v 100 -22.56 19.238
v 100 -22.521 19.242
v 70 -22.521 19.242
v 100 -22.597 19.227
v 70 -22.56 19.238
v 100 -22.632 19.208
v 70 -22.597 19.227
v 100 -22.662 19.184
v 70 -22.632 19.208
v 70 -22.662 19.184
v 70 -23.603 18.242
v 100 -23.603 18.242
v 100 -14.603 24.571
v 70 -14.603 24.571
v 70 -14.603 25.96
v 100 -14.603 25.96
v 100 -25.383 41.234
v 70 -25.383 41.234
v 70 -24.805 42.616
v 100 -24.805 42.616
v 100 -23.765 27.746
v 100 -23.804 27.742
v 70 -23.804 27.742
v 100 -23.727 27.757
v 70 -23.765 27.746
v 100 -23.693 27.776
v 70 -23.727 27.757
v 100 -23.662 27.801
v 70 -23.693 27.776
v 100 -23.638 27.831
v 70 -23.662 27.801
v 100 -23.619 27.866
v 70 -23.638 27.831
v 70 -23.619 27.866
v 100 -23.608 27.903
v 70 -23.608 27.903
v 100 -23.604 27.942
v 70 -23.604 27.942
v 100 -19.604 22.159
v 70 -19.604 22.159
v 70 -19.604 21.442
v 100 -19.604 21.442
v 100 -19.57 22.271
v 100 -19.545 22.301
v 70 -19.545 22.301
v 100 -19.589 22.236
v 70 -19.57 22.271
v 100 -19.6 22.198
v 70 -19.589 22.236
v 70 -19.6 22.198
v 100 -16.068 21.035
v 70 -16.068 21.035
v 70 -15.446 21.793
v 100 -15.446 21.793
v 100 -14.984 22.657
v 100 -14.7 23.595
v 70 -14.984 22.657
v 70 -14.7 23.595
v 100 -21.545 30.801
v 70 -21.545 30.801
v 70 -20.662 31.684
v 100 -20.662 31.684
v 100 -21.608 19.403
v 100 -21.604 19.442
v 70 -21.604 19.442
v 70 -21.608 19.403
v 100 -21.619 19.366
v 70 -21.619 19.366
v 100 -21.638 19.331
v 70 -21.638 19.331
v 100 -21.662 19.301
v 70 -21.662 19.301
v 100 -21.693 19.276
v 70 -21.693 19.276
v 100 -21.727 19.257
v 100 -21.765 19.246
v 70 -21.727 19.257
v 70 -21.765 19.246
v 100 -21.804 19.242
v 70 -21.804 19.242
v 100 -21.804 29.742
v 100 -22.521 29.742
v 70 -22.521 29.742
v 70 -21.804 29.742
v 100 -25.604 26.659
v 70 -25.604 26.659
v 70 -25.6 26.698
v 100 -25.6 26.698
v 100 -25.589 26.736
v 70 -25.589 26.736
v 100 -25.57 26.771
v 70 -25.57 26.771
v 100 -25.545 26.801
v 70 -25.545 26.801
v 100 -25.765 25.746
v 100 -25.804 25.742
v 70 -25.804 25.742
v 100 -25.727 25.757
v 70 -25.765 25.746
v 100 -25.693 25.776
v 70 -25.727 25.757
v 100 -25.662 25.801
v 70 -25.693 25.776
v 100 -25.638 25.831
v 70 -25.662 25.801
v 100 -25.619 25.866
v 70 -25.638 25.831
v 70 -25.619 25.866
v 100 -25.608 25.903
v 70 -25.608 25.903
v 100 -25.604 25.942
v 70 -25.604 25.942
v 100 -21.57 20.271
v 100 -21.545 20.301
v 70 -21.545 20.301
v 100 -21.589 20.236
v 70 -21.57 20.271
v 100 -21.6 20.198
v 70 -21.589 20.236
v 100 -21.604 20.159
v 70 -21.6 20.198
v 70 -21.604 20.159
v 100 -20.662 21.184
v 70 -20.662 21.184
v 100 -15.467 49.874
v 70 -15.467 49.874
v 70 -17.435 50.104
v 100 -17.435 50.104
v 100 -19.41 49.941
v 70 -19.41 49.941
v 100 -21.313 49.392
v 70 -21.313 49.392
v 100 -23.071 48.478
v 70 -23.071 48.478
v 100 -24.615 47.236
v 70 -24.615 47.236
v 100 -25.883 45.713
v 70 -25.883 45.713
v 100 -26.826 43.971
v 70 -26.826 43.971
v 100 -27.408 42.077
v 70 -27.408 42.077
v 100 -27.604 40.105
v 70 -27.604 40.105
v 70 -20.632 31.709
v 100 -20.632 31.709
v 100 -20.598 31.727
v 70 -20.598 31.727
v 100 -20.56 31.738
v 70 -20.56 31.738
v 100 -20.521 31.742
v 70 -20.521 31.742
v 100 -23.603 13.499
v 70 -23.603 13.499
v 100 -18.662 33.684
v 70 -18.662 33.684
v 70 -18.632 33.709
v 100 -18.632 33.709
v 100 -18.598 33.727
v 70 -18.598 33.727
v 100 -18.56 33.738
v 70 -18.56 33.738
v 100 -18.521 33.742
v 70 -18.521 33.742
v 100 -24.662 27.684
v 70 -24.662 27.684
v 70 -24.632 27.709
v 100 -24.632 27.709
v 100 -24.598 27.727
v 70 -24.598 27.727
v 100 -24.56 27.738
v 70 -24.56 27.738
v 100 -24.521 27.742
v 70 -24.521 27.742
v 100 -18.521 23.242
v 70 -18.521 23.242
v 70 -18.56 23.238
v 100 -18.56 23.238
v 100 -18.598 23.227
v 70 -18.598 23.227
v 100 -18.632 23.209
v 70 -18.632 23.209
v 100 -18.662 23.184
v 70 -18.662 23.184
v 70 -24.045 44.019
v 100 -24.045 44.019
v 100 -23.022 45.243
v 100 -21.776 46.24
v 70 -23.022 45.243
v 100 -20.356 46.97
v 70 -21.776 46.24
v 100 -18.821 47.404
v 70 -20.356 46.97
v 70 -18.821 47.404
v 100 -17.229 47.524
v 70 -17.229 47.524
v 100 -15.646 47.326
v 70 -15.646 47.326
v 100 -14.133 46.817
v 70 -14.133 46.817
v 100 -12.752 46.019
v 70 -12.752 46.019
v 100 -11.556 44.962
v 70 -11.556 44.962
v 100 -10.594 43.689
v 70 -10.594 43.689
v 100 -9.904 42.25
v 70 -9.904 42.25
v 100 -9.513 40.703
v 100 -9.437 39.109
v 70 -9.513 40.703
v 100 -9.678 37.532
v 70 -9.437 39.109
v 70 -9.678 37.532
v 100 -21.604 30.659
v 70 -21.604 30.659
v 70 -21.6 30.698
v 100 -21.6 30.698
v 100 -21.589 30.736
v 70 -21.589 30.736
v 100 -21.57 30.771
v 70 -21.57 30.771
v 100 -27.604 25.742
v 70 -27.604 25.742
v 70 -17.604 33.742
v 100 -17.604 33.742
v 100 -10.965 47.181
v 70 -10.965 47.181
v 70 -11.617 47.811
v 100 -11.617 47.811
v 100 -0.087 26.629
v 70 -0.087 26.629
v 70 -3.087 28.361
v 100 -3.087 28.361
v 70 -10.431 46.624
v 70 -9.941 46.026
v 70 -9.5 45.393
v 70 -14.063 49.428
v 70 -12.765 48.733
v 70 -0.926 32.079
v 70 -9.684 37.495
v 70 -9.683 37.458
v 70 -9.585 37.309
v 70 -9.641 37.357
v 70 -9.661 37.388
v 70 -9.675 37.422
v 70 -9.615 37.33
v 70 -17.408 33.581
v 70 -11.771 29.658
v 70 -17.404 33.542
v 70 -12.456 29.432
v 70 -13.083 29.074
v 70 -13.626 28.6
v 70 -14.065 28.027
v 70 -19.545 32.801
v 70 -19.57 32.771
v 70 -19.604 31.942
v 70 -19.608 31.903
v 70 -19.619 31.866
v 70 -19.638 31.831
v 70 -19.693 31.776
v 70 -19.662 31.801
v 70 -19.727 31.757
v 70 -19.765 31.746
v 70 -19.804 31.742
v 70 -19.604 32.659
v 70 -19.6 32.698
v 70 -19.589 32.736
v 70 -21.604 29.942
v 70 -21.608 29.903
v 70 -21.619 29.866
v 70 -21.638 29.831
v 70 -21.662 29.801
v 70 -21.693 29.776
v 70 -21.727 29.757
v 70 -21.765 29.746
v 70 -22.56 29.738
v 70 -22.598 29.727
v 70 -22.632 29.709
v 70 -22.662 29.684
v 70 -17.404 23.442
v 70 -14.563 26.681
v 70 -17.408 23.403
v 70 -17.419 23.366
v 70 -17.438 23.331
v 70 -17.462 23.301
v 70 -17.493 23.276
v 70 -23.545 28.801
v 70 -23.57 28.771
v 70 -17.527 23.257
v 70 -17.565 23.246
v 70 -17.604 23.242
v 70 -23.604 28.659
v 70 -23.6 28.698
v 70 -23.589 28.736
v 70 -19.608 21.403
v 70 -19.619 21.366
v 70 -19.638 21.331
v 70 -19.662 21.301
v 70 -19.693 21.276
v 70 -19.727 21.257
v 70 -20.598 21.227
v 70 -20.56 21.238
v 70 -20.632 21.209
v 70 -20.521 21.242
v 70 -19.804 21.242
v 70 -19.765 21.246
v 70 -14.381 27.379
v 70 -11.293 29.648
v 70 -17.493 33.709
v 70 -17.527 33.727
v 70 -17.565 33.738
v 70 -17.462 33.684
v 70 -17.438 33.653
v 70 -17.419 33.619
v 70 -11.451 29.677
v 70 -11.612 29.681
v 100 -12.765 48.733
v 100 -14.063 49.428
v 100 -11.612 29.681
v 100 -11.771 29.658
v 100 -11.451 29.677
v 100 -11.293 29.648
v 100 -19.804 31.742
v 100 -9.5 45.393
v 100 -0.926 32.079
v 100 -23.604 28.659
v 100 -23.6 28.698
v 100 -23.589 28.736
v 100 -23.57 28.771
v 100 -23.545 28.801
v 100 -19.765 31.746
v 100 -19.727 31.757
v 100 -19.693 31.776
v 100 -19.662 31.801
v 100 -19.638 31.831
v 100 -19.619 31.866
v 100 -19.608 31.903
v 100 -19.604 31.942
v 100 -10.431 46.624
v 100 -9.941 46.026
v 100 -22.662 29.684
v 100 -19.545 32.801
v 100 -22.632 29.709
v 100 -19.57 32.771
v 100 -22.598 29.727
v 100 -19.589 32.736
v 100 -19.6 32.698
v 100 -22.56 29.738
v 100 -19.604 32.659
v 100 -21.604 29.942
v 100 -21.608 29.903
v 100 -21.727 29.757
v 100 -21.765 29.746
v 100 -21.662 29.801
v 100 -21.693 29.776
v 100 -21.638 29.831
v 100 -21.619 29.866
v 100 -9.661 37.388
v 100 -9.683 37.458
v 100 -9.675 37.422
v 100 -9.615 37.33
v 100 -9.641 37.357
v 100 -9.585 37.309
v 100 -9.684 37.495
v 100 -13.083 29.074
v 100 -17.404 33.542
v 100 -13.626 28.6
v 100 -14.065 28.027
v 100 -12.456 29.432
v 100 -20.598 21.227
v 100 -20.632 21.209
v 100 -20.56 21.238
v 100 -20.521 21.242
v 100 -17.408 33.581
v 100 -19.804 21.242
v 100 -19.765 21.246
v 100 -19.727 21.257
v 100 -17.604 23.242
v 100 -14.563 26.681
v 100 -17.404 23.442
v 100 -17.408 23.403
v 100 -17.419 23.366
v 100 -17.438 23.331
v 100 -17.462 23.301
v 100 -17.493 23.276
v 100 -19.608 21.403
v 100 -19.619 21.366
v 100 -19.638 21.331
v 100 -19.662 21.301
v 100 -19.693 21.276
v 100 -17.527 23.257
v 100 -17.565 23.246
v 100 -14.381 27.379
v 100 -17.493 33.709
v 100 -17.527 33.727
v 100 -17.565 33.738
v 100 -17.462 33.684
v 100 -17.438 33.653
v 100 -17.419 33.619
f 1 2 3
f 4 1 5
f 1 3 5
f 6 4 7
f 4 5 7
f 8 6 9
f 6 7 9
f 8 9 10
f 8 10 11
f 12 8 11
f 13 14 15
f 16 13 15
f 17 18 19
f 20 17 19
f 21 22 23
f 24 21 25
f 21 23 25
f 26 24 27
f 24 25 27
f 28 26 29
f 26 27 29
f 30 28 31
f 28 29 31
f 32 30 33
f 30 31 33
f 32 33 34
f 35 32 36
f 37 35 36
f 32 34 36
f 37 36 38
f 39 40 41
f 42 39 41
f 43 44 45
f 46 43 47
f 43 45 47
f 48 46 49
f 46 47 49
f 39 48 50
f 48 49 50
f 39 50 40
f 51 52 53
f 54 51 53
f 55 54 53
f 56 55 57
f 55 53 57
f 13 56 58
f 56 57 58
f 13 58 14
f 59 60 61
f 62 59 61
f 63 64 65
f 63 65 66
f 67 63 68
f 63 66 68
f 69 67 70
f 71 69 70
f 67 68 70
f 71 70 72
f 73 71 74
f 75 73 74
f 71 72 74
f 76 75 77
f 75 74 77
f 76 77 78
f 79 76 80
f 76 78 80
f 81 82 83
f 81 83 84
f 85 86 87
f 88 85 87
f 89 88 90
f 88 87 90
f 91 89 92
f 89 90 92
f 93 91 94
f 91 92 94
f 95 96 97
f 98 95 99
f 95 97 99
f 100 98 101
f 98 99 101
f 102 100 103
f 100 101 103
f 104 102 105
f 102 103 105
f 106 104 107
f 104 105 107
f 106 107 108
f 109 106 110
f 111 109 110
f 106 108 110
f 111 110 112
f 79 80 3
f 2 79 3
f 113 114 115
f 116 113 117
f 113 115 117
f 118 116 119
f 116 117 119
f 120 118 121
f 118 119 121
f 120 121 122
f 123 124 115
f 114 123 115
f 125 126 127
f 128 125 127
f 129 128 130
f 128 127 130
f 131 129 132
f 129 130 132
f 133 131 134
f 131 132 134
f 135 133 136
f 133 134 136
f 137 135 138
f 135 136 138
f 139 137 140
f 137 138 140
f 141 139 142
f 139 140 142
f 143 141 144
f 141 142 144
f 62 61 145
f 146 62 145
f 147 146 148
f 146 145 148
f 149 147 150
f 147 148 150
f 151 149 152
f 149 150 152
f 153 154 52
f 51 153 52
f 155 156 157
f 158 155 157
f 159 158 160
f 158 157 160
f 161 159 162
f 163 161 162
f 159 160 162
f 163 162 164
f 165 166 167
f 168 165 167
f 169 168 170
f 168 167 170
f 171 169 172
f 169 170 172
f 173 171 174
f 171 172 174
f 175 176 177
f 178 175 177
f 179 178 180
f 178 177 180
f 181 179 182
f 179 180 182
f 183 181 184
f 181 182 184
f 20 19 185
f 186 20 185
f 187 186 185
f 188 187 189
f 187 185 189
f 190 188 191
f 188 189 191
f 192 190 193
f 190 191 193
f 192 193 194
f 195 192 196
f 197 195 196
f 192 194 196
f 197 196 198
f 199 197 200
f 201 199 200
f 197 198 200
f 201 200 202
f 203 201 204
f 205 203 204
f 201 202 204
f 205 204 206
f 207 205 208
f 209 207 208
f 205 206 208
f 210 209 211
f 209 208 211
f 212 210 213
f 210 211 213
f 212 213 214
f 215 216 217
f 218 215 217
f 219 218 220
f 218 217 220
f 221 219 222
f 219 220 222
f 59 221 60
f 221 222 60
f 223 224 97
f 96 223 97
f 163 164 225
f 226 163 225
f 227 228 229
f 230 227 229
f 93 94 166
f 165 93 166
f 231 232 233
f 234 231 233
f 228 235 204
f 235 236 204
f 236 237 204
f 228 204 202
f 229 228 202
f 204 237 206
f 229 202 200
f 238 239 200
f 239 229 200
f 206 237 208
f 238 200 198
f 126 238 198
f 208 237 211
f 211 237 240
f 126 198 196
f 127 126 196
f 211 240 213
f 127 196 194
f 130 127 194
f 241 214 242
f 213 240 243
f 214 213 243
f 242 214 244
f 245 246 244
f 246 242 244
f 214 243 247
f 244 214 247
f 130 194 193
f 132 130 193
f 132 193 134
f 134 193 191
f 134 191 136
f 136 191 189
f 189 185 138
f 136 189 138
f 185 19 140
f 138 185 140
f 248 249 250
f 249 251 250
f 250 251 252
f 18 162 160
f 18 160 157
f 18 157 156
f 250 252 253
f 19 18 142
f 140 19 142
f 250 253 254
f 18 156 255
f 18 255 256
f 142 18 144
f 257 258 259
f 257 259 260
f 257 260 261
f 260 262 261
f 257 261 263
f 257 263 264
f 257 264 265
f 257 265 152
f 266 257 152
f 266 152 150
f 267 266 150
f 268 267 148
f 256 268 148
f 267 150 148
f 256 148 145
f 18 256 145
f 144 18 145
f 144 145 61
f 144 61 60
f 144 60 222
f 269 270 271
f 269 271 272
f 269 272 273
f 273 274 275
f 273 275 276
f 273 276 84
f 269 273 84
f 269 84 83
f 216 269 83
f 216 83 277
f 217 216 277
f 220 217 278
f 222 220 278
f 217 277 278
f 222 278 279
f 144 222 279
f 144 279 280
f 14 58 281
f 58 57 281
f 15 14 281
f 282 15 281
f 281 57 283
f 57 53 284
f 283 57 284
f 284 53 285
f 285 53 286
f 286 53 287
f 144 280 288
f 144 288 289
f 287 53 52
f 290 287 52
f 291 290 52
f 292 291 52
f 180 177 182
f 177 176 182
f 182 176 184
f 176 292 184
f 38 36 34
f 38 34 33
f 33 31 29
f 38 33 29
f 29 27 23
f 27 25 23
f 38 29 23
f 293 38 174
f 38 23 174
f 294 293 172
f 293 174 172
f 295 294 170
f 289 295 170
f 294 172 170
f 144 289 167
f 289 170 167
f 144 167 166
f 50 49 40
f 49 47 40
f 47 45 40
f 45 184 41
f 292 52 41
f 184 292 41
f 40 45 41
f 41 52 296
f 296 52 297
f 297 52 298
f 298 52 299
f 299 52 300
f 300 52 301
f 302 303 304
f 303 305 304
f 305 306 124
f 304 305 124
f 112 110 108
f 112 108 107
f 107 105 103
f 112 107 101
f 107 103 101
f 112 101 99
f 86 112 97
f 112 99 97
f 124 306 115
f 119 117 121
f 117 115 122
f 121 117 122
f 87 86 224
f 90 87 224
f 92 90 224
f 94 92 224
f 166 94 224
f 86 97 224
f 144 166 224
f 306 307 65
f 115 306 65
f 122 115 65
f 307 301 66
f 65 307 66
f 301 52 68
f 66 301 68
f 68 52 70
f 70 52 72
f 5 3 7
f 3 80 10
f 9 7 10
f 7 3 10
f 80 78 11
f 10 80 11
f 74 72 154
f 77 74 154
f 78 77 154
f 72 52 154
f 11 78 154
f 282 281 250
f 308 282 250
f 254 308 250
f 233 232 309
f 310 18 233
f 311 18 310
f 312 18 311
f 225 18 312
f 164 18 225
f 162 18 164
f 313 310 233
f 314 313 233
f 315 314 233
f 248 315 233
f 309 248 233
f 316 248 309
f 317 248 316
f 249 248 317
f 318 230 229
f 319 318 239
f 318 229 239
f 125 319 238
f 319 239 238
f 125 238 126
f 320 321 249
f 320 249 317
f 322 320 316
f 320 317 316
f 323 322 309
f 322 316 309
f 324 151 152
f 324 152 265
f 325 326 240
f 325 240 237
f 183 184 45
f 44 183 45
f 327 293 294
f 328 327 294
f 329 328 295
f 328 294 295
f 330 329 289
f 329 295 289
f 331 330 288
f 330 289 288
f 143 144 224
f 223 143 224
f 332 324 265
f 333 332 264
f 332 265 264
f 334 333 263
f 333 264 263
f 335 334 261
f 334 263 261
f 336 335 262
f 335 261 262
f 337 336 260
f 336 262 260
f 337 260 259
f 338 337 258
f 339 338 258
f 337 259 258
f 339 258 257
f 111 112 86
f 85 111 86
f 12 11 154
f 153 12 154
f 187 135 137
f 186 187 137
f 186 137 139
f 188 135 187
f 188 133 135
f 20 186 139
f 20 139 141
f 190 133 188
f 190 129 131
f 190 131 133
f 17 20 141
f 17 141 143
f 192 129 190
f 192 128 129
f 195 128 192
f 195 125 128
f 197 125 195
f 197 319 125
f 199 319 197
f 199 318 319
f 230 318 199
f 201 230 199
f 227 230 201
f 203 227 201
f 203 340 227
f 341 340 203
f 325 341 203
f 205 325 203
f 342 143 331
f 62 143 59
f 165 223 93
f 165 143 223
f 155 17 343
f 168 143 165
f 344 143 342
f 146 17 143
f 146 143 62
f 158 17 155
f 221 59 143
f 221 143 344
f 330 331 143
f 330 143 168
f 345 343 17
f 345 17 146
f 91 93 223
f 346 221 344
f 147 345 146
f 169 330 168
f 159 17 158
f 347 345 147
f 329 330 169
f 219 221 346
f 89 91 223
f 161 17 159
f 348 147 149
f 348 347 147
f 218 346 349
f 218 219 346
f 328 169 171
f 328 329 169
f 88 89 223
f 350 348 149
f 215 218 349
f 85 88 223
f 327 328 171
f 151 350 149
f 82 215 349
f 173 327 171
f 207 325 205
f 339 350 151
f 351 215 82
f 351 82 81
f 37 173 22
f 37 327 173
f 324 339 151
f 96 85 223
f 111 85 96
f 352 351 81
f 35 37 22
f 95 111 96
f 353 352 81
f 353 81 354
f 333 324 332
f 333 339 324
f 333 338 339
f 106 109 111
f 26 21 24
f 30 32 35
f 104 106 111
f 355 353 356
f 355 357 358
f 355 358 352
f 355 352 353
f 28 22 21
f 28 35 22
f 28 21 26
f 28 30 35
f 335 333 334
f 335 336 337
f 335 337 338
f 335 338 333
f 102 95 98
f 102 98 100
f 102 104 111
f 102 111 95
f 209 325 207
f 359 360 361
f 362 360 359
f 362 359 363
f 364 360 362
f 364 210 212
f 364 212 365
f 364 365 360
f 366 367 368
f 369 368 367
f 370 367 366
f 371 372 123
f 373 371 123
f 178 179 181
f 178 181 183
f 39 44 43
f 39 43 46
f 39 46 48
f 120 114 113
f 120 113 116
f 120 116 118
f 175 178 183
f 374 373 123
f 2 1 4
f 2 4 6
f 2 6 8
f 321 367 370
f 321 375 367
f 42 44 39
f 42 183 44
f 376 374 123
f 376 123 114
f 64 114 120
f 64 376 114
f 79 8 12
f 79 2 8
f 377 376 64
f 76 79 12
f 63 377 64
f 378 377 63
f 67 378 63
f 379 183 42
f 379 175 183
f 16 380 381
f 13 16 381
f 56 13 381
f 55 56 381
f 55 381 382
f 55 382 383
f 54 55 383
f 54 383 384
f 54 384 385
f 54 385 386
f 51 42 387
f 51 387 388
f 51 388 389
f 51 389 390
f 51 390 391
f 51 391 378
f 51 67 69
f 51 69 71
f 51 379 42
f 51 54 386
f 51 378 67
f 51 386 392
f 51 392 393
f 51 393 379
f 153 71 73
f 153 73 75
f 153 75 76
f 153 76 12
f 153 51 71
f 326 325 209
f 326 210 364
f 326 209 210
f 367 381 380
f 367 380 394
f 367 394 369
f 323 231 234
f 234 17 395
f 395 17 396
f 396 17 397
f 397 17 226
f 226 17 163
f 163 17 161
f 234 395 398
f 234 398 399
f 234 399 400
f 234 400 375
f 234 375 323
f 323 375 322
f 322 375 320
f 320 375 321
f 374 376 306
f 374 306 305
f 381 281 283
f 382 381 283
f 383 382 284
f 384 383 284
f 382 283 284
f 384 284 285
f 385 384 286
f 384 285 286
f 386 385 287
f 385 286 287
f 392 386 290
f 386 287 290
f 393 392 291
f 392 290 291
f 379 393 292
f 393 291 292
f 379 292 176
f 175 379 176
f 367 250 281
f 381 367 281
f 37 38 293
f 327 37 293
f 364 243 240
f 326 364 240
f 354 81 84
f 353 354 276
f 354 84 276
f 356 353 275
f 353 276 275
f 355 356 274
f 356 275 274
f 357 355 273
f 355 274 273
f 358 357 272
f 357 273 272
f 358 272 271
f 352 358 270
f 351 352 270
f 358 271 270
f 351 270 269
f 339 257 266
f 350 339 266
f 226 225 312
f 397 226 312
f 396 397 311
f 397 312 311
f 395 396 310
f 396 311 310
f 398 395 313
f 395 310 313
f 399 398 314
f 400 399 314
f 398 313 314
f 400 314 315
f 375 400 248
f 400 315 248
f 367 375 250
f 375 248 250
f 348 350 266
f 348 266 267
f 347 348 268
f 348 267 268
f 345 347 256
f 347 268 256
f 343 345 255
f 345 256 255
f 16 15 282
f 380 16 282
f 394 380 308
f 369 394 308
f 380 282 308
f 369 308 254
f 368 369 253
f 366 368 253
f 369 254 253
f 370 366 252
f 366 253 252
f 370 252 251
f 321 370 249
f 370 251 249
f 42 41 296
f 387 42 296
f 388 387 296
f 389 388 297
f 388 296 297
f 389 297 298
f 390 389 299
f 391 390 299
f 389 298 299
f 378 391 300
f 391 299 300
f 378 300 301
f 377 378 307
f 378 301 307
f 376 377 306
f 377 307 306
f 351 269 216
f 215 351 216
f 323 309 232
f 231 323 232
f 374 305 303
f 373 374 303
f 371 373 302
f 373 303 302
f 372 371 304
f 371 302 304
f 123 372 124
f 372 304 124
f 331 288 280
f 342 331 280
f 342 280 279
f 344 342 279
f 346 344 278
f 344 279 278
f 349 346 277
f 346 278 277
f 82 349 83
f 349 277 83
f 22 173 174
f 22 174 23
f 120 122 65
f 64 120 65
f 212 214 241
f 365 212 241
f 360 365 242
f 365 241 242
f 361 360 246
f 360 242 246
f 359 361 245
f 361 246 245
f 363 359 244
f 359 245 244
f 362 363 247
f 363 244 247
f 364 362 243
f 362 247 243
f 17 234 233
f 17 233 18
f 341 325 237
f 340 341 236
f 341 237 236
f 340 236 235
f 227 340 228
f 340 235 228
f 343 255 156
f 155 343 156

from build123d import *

# Parameters (mm, degrees)
BOSS_EXTRUDE1_DEPTH     = 100
CUT_EXTRUDE1_DEPTH      = 25
CUT_EXTRUDE1_DEPTH_BACK = 23


with BuildPart() as part:
    # Sketch1 → Boss-Extrude1 (new body)
    with BuildSketch(Plane(origin=(0, 0, 0), x_dir=(0, 0, -1), z_dir=(1, 0, 0))):
        with BuildLine():
            Line((-25.742274507, -27.603839777), (-25.742274507, -25.803839777))
            ThreePointArc((-25.742274507, -25.803839777), (-25.800853151, -25.66241842), (-25.942274507, -25.603839777))
            Line((-25.942274507, -25.603839777), (-26.659431795, -25.603839777))
            ThreePointArc((-26.659431795, -25.603839777), (-26.735968481, -25.588615683), (-26.800853151, -25.545261133))
            Line((-26.800853151, -25.545261133), (-27.683695863, -24.66241842))
            ThreePointArc((-27.683695863, -24.66241842), (-27.727050414, -24.597533751), (-27.742274507, -24.520997064))
            Line((-27.742274507, -24.520997064), (-27.742274507, -23.803839777))
            ThreePointArc((-27.742274507, -23.803839777), (-27.800853151, -23.66241842), (-27.942274507, -23.603839777))
            Line((-27.942274507, -23.603839777), (-28.659431795, -23.603839777))
            ThreePointArc((-28.659431795, -23.603839777), (-28.735968481, -23.588615683), (-28.800853151, -23.545261133))
            Line((-28.800853151, -23.545261133), (-29.683695863, -22.66241842))
            ThreePointArc((-29.683695863, -22.66241842), (-29.727050414, -22.597533751), (-29.742274507, -22.520997064))
            Line((-29.742274507, -22.520997064), (-29.742274507, -21.803839777))
            ThreePointArc((-29.742274507, -21.803839777), (-29.800853151, -21.66241842), (-29.942274507, -21.603839777))
            Line((-29.942274507, -21.603839777), (-30.659431795, -21.603839777))
            ThreePointArc((-30.659431795, -21.603839777), (-30.735968481, -21.588615683), (-30.800853151, -21.545261133))
            Line((-30.800853151, -21.545261133), (-31.683695863, -20.66241842))
            ThreePointArc((-31.683695863, -20.66241842), (-31.727050414, -20.597533751), (-31.742274507, -20.520997064))
            Line((-31.742274507, -20.520997064), (-31.742274507, -19.803839777))
            ThreePointArc((-31.742274507, -19.803839777), (-31.800853151, -19.66241842), (-31.942274507, -19.603839777))
            Line((-31.942274507, -19.603839777), (-32.659431795, -19.603839777))
            ThreePointArc((-32.659431795, -19.603839777), (-32.735968481, -19.588615683), (-32.800853151, -19.545261133))
            Line((-32.800853151, -19.545261133), (-33.683695863, -18.66241842))
            ThreePointArc((-33.683695863, -18.66241842), (-33.727050414, -18.597533751), (-33.742274507, -18.520997064))
            Line((-33.742274507, -18.520997064), (-33.742274507, -17.603839777))
            ThreePointArc((-33.742274507, -17.603839777), (-33.683695863, -17.46241842), (-33.542274507, -17.403839777))
            Line((-33.542274507, -17.403839777), (-23.442274507, -17.403839777))
            ThreePointArc((-23.442274507, -17.403839777), (-23.300853151, -17.46241842), (-23.242274507, -17.603839777))
            Line((-23.242274507, -17.603839777), (-23.242274507, -18.520997064))
            ThreePointArc((-23.242274507, -18.520997064), (-23.227050414, -18.597533751), (-23.183695863, -18.66241842))
            Line((-23.183695863, -18.66241842), (-22.300853151, -19.545261133))
            ThreePointArc((-22.300853151, -19.545261133), (-22.235968481, -19.588615683), (-22.159431795, -19.603839777))
            Line((-22.159431795, -19.603839777), (-21.442274507, -19.603839777))
            ThreePointArc((-21.442274507, -19.603839777), (-21.300853151, -19.66241842), (-21.242274507, -19.803839777))
            Line((-21.242274507, -19.803839777), (-21.242274507, -20.520997064))
            ThreePointArc((-21.242274507, -20.520997064), (-21.227050414, -20.597533751), (-21.183695863, -20.66241842))
            Line((-21.183695863, -20.66241842), (-20.300853151, -21.545261133))
            ThreePointArc((-20.300853151, -21.545261133), (-20.235968481, -21.588615683), (-20.159431795, -21.603839777))
            Line((-20.159431795, -21.603839777), (-19.442118142, -21.603839777))
            ThreePointArc((-19.442118142, -21.603839777), (-19.300696786, -21.66241842), (-19.242118142, -21.803839777))
            Line((-19.242118142, -21.803839777), (-19.242118142, -22.520623569))
            ThreePointArc((-19.242118142, -22.520623569), (-19.226894049, -22.597160256), (-19.183539499, -22.662044925))
            Line((-19.183539499, -22.662044925), (-18.242118142, -23.603466282))
            Line((-18.242118142, -23.603466282), (-17.742118142, -23.603466282))
            Line((-17.742118142, -23.603466282), (-13.499477455, -23.603466282))
            Line((-13.499477455, -23.603466282), (-21.035011361, -16.067932376))
            ThreePointArc((-21.035011361, -16.067932376), (-22.657128105, -14.984068619), (-24.570545267, -14.603466282))
            Line((-24.570545267, -14.603466282), (-25.960279372, -14.603466282))
            ThreePointArc((-25.960279372, -14.603466282), (-28.324188996, -13.859549098), (-29.658362326, -11.771137499))
            ThreePointArc((-29.658362326, -11.771137499), (-29.682182939, -11.531427852), (-29.647989066, -11.292976777))
            Line((-29.647989066, -11.292976777), (-26.628869488, -0.086805783))
            Line((-26.628869488, -0.086805783), (-28.360920296, -3.086805783))
            Line((-28.360920296, -3.086805783), (-41.233903642, -25.383466984))
            Line((-41.233903642, -25.383466984), (-42.615547882, -24.805037605))
            ThreePointArc((-42.615547882, -24.805037605), (-47.10930963, -14.877001433), (-37.531576616, -9.678268204))
            ThreePointArc((-37.531576616, -9.678268204), (-37.404269433, -9.668981846), (-37.308507446, -9.584583996))
            Line((-37.308507446, -9.584583996), (-32.078617814, -0.926149435))
            Line((-32.078617814, -0.926149435), (-45.393459966, -9.499644714))
            ThreePointArc((-45.393459966, -9.499644714), (-46.329728955, -10.180367196), (-47.181058303, -10.964727481))
            Line((-47.181058303, -10.964727481), (-47.811097829, -11.616550026))
            ThreePointArc((-47.811097829, -11.616550026), (-49.110536056, -13.39823645), (-49.874169518, -15.467006653))
            ThreePointArc((-49.874169518, -15.467006653), (-47.89514388, -23.874073774), (-40.105139668, -27.603839777))
            Line((-40.105139668, -27.603839777), (-25.742274507, -27.603839777))
        make_face()
    extrude(amount=BOSS_EXTRUDE1_DEPTH)

    # Sketch2 → Cut-Extrude1 (cut, two sides: drawn at the far end of the back side and taken through both)
    with BuildSketch(Plane(origin=(76.97885739, -34.993991596, 31.933978), x_dir=(1, 0, 0), z_dir=(0, 0, 1)).offset(-CUT_EXTRUDE1_DEPTH_BACK)):
        Polygon((-46.97885739, 36.842742805), (-6.97885739, 36.842742805), (-6.97885739, -2.226993345), (-46.97885739, -2.226993345), (-84.546864986, -2.226993345), (-84.546864986, 36.842742805), align=None)
    extrude(amount=CUT_EXTRUDE1_DEPTH + CUT_EXTRUDE1_DEPTH_BACK, mode=Mode.SUBTRACT)


solid = part.part
